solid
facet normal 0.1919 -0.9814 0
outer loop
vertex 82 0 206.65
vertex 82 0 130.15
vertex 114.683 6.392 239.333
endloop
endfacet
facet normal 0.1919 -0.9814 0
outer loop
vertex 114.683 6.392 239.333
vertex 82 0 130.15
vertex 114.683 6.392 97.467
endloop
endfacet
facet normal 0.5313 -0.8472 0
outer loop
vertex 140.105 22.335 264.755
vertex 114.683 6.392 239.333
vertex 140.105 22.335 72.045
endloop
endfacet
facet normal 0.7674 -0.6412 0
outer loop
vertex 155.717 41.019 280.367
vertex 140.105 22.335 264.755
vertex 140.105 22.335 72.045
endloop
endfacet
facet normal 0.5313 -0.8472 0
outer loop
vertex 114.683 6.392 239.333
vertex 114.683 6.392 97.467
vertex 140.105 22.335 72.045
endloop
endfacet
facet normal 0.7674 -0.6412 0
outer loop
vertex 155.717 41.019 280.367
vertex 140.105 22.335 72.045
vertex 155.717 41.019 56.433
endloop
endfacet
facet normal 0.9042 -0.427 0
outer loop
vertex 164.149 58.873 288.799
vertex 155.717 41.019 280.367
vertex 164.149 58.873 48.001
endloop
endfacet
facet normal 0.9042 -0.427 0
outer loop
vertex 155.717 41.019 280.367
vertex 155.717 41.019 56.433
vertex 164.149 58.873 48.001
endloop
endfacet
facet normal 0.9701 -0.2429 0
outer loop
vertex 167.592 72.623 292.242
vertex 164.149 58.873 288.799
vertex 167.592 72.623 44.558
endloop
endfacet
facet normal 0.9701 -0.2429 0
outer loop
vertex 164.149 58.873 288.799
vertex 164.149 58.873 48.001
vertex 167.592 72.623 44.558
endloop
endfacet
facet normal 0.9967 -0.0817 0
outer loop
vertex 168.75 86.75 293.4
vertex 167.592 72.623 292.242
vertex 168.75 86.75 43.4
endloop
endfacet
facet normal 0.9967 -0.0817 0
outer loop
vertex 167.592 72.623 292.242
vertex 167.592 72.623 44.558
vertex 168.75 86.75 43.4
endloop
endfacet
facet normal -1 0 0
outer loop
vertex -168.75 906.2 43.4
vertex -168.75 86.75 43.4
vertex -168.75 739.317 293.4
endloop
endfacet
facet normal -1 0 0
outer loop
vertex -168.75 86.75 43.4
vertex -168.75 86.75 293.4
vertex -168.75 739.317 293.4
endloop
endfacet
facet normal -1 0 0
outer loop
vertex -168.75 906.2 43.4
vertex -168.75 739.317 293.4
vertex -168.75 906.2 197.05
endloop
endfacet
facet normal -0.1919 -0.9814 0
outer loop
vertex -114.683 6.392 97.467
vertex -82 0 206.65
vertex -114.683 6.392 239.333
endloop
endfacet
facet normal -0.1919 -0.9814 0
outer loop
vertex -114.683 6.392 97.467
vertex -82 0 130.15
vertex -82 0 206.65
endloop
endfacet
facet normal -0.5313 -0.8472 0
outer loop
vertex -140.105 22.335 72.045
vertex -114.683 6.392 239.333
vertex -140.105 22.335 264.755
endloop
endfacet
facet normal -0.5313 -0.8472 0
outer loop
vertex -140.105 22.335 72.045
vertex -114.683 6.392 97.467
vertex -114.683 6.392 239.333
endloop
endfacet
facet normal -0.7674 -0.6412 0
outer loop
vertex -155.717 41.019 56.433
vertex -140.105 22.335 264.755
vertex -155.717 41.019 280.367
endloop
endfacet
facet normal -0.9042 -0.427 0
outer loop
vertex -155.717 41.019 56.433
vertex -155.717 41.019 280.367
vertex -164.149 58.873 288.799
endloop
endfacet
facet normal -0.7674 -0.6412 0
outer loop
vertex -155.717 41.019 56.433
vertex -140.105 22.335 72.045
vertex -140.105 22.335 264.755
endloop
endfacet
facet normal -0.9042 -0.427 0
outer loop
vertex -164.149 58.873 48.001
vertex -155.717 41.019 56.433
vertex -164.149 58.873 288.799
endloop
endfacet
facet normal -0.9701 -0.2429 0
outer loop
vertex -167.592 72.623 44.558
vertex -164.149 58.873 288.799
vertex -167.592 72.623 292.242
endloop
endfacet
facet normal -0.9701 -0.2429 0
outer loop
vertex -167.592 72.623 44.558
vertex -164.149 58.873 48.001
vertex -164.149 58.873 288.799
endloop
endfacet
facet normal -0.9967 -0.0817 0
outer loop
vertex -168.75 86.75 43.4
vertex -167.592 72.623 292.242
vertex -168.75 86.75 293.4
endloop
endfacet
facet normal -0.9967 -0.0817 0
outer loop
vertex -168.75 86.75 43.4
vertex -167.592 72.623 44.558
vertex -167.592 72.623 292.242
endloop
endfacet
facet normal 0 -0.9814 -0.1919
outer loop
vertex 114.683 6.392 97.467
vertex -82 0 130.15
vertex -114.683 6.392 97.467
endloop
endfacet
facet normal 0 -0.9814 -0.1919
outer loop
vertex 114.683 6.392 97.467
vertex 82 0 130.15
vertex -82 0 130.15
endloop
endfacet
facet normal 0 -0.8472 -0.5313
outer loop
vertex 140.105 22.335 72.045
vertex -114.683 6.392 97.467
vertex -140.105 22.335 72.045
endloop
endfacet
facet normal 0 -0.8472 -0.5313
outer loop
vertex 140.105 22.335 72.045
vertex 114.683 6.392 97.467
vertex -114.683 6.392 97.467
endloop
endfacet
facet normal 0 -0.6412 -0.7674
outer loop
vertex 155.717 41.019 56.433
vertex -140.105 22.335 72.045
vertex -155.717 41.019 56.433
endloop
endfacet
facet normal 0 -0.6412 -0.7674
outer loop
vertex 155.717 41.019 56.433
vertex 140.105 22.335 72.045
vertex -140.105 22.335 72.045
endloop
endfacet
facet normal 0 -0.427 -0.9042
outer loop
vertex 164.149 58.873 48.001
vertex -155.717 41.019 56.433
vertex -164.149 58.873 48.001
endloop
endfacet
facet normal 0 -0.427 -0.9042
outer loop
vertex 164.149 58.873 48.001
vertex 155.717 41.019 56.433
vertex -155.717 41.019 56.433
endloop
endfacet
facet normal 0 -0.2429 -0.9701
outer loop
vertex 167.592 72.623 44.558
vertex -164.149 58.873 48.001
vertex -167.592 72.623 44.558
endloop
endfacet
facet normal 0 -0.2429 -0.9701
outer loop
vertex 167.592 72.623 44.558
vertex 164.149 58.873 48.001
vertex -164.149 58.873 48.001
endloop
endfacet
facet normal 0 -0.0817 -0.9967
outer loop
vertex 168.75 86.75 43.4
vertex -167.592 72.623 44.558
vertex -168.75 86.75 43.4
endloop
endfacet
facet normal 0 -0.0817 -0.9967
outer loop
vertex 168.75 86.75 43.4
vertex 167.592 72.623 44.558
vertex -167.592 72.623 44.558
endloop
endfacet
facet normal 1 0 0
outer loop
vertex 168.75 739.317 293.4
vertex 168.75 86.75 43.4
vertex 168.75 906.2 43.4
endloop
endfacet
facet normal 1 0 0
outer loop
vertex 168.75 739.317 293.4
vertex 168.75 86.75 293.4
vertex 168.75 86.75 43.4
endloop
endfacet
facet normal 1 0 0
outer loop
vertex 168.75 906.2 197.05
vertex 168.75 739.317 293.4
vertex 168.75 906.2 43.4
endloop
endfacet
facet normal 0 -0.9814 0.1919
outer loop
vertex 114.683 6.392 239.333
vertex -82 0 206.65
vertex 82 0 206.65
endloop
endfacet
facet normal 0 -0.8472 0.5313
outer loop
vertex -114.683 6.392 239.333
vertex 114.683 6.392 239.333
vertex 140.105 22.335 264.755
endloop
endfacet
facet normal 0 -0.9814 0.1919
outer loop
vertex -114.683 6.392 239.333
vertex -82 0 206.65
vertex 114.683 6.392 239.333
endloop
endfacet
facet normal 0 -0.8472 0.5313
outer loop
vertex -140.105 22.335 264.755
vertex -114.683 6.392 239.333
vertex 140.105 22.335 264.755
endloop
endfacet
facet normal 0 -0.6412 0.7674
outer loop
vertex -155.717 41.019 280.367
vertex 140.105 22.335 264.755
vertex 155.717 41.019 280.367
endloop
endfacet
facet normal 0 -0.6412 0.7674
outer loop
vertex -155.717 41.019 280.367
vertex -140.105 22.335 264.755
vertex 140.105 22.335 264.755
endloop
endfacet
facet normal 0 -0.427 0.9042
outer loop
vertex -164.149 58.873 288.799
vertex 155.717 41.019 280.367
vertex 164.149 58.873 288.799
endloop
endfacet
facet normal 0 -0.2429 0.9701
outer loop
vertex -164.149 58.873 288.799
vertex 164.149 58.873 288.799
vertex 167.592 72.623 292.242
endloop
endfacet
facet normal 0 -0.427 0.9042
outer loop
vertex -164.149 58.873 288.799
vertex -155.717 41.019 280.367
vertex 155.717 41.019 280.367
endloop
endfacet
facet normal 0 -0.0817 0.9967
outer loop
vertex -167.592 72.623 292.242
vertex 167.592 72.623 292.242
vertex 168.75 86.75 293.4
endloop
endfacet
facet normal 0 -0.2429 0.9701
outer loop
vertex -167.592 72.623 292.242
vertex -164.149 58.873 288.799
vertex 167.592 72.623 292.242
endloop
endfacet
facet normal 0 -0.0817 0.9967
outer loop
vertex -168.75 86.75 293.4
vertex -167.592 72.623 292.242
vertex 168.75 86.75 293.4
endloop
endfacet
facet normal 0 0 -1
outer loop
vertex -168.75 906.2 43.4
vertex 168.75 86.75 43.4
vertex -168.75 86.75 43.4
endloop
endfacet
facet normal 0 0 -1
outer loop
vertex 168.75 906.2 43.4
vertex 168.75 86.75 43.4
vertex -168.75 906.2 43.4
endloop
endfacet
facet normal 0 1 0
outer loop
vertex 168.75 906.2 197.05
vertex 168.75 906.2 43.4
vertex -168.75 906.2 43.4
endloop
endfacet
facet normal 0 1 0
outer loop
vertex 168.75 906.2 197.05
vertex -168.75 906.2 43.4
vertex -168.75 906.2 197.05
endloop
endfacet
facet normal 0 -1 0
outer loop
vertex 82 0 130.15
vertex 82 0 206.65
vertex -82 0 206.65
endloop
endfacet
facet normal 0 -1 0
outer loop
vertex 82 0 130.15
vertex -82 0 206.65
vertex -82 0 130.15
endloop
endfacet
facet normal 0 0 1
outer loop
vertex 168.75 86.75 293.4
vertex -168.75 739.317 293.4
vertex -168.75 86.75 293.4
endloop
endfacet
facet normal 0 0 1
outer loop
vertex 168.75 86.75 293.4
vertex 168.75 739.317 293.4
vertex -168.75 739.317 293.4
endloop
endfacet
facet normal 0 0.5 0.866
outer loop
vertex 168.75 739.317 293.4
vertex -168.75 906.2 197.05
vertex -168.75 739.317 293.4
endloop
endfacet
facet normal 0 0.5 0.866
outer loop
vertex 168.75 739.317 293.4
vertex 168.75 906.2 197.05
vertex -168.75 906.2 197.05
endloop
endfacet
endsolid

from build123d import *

# Parameters (mm, degrees)
F2_DEPTH = 168.75
F3_R     = 86.75


with BuildPart() as f2:
    # F1 (on Right) → F2 (new body, symmetric)
    with BuildSketch(Plane.YZ):
        Polygon((0, 293.4), (0, 43.4), (906.2, 43.4), (906.2, 197.05), (739.3169046907, 293.4), align=None)
    extrude(amount=F2_DEPTH, both=True)

    # F3
    f3_edges = [f2.edges().sort_by_distance(p)[0] for p in [
        (0, 0, 293.4),
        (168.75, 0, 168.4),
        (-168.75, 0, 168.4),
        (0, 0, 43.4),
    ]]
    fillet(f3_edges, radius=F3_R)


solid = f2.part
